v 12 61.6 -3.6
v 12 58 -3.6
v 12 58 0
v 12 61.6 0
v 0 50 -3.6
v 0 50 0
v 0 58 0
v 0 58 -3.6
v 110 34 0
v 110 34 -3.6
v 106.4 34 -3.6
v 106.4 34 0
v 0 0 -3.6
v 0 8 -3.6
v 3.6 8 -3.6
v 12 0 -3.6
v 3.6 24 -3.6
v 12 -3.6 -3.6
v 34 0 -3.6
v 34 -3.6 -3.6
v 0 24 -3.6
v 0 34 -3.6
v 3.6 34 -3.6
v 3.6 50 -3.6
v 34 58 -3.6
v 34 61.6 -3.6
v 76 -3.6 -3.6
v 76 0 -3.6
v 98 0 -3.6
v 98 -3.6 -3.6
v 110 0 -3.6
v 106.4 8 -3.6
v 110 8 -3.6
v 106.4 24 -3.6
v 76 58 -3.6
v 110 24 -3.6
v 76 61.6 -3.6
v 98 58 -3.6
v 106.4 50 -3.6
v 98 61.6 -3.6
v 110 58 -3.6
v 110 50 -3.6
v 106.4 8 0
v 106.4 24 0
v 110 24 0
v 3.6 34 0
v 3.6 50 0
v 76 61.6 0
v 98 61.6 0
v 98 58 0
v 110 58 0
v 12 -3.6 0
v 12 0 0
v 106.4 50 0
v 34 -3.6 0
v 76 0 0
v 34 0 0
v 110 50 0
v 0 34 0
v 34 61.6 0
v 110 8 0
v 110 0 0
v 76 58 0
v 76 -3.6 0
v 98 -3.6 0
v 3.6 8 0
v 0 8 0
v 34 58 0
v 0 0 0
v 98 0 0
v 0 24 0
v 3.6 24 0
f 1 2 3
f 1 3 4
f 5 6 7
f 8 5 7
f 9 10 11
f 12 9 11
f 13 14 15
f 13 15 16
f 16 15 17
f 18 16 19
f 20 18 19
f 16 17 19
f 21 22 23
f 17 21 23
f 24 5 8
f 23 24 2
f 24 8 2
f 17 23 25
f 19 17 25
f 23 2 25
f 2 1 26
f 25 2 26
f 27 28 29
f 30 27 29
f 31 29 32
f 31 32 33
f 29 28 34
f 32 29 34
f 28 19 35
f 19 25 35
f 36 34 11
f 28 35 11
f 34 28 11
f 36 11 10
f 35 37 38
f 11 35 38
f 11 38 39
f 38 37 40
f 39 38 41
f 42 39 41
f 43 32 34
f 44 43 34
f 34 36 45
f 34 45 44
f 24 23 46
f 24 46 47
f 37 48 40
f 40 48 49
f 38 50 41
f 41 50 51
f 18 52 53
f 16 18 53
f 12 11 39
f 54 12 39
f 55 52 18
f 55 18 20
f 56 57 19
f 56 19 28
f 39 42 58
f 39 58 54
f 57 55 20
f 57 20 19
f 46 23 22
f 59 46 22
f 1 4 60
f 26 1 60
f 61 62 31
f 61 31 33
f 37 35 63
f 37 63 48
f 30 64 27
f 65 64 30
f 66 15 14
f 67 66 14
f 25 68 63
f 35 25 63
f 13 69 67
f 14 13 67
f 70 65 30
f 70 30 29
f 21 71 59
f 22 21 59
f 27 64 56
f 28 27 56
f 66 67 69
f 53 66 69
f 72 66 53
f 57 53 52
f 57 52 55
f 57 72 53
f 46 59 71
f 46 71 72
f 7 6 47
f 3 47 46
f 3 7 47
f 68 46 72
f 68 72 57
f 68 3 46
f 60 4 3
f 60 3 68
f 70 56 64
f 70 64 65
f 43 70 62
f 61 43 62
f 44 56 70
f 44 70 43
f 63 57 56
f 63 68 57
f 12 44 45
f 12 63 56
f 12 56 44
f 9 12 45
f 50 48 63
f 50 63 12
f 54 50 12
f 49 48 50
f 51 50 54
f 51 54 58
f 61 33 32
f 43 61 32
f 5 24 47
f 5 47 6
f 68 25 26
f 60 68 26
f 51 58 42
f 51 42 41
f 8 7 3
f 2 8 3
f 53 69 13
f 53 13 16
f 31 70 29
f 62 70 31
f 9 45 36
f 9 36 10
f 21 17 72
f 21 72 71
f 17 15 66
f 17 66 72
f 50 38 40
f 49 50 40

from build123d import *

# Parameters (mm, degrees)
SKETCH_1_W             = 110
SKETCH_1_H             = 58
SM_BASE_FLANGE_1_DEPTH = 3.6
CUT_EXTRUDE_1_REACH    = 126.406
SKETCH_2_W             = 3.6
SKETCH_2_H             = 16
SKETCH_3_W             = 22
SKETCH_3_H             = 3.6
EXTRUDE_1_DEPTH        = 3.6


# Sheet-metal steps are written as plain solids
with BuildPart() as part:
    # Sketch 1 → Базовая кромка1 (new body)
    with BuildSketch(Plane.XY):
        with Locations((55, 29)):
            Rectangle(SKETCH_1_W, SKETCH_1_H)
    extrude(amount=-SM_BASE_FLANGE_1_DEPTH)

    # Sketch 2 → Вырез-Вытянуть1 (cut, up to next)
    with BuildSketch(Plane(origin=(0, 0, -3.6), x_dir=(-1, 0, 0), z_dir=(0, 0, -1)), mode=Mode.PRIVATE) as cut_extrude_1_sk1:
        with Locations((-108.2, 42)):
            Rectangle(SKETCH_2_W, SKETCH_2_H)
    cut_extrude_1_tool1 = extrude(cut_extrude_1_sk1.sketch, amount=-CUT_EXTRUDE_1_REACH, mode=Mode.PRIVATE) & part.part
    # Sketch 2 → Вырез-Вытянуть1 (cut, up to next)
    with BuildSketch(Plane(origin=(0, 0, -3.6), x_dir=(-1, 0, 0), z_dir=(0, 0, -1)), mode=Mode.PRIVATE) as cut_extrude_1_sk2:
        with Locations((-108.2, 16)):
            Rectangle(SKETCH_2_W, SKETCH_2_H)
    cut_extrude_1_tool2 = extrude(cut_extrude_1_sk2.sketch, amount=-CUT_EXTRUDE_1_REACH, mode=Mode.PRIVATE) & part.part
    # Sketch 2 → Вырез-Вытянуть1 (cut, up to next)
    with BuildSketch(Plane(origin=(0, 0, -3.6), x_dir=(-1, 0, 0), z_dir=(0, 0, -1)), mode=Mode.PRIVATE) as cut_extrude_1_sk3:
        with Locations((-1.8, 16)):
            Rectangle(SKETCH_2_W, SKETCH_2_H)
    cut_extrude_1_tool3 = extrude(cut_extrude_1_sk3.sketch, amount=-CUT_EXTRUDE_1_REACH, mode=Mode.PRIVATE) & part.part
    # Sketch 2 → Вырез-Вытянуть1 (cut, up to next)
    with BuildSketch(Plane(origin=(0, 0, -3.6), x_dir=(-1, 0, 0), z_dir=(0, 0, -1)), mode=Mode.PRIVATE) as cut_extrude_1_sk4:
        with Locations((-1.8, 42)):
            Rectangle(SKETCH_2_W, SKETCH_2_H)
    cut_extrude_1_tool4 = extrude(cut_extrude_1_sk4.sketch, amount=-CUT_EXTRUDE_1_REACH, mode=Mode.PRIVATE) & part.part
    add(cut_extrude_1_tool1.solids().sort_by_distance((108.2, 42, -3.6))[0], mode=Mode.SUBTRACT)
    add(cut_extrude_1_tool2.solids().sort_by_distance((108.2, 16, -3.6))[0], mode=Mode.SUBTRACT)
    add(cut_extrude_1_tool3.solids().sort_by_distance((1.8, 16, -3.6))[0], mode=Mode.SUBTRACT)
    add(cut_extrude_1_tool4.solids().sort_by_distance((1.8, 42, -3.6))[0], mode=Mode.SUBTRACT)

    # Эскиз3 → Бобышка-Вытянуть1 (add)
    with BuildSketch(Plane.XY):
        with Locations((23, 59.8)):
            Rectangle(SKETCH_3_W, SKETCH_3_H)
        with Locations((87, 59.8)):
            Rectangle(SKETCH_3_W, SKETCH_3_H)
        with Locations((23, -1.8)):
            Rectangle(SKETCH_3_W, SKETCH_3_H)
        with Locations((87, -1.8)):
            Rectangle(SKETCH_3_W, SKETCH_3_H)
    extrude(amount=-EXTRUDE_1_DEPTH)


solid = part.part
